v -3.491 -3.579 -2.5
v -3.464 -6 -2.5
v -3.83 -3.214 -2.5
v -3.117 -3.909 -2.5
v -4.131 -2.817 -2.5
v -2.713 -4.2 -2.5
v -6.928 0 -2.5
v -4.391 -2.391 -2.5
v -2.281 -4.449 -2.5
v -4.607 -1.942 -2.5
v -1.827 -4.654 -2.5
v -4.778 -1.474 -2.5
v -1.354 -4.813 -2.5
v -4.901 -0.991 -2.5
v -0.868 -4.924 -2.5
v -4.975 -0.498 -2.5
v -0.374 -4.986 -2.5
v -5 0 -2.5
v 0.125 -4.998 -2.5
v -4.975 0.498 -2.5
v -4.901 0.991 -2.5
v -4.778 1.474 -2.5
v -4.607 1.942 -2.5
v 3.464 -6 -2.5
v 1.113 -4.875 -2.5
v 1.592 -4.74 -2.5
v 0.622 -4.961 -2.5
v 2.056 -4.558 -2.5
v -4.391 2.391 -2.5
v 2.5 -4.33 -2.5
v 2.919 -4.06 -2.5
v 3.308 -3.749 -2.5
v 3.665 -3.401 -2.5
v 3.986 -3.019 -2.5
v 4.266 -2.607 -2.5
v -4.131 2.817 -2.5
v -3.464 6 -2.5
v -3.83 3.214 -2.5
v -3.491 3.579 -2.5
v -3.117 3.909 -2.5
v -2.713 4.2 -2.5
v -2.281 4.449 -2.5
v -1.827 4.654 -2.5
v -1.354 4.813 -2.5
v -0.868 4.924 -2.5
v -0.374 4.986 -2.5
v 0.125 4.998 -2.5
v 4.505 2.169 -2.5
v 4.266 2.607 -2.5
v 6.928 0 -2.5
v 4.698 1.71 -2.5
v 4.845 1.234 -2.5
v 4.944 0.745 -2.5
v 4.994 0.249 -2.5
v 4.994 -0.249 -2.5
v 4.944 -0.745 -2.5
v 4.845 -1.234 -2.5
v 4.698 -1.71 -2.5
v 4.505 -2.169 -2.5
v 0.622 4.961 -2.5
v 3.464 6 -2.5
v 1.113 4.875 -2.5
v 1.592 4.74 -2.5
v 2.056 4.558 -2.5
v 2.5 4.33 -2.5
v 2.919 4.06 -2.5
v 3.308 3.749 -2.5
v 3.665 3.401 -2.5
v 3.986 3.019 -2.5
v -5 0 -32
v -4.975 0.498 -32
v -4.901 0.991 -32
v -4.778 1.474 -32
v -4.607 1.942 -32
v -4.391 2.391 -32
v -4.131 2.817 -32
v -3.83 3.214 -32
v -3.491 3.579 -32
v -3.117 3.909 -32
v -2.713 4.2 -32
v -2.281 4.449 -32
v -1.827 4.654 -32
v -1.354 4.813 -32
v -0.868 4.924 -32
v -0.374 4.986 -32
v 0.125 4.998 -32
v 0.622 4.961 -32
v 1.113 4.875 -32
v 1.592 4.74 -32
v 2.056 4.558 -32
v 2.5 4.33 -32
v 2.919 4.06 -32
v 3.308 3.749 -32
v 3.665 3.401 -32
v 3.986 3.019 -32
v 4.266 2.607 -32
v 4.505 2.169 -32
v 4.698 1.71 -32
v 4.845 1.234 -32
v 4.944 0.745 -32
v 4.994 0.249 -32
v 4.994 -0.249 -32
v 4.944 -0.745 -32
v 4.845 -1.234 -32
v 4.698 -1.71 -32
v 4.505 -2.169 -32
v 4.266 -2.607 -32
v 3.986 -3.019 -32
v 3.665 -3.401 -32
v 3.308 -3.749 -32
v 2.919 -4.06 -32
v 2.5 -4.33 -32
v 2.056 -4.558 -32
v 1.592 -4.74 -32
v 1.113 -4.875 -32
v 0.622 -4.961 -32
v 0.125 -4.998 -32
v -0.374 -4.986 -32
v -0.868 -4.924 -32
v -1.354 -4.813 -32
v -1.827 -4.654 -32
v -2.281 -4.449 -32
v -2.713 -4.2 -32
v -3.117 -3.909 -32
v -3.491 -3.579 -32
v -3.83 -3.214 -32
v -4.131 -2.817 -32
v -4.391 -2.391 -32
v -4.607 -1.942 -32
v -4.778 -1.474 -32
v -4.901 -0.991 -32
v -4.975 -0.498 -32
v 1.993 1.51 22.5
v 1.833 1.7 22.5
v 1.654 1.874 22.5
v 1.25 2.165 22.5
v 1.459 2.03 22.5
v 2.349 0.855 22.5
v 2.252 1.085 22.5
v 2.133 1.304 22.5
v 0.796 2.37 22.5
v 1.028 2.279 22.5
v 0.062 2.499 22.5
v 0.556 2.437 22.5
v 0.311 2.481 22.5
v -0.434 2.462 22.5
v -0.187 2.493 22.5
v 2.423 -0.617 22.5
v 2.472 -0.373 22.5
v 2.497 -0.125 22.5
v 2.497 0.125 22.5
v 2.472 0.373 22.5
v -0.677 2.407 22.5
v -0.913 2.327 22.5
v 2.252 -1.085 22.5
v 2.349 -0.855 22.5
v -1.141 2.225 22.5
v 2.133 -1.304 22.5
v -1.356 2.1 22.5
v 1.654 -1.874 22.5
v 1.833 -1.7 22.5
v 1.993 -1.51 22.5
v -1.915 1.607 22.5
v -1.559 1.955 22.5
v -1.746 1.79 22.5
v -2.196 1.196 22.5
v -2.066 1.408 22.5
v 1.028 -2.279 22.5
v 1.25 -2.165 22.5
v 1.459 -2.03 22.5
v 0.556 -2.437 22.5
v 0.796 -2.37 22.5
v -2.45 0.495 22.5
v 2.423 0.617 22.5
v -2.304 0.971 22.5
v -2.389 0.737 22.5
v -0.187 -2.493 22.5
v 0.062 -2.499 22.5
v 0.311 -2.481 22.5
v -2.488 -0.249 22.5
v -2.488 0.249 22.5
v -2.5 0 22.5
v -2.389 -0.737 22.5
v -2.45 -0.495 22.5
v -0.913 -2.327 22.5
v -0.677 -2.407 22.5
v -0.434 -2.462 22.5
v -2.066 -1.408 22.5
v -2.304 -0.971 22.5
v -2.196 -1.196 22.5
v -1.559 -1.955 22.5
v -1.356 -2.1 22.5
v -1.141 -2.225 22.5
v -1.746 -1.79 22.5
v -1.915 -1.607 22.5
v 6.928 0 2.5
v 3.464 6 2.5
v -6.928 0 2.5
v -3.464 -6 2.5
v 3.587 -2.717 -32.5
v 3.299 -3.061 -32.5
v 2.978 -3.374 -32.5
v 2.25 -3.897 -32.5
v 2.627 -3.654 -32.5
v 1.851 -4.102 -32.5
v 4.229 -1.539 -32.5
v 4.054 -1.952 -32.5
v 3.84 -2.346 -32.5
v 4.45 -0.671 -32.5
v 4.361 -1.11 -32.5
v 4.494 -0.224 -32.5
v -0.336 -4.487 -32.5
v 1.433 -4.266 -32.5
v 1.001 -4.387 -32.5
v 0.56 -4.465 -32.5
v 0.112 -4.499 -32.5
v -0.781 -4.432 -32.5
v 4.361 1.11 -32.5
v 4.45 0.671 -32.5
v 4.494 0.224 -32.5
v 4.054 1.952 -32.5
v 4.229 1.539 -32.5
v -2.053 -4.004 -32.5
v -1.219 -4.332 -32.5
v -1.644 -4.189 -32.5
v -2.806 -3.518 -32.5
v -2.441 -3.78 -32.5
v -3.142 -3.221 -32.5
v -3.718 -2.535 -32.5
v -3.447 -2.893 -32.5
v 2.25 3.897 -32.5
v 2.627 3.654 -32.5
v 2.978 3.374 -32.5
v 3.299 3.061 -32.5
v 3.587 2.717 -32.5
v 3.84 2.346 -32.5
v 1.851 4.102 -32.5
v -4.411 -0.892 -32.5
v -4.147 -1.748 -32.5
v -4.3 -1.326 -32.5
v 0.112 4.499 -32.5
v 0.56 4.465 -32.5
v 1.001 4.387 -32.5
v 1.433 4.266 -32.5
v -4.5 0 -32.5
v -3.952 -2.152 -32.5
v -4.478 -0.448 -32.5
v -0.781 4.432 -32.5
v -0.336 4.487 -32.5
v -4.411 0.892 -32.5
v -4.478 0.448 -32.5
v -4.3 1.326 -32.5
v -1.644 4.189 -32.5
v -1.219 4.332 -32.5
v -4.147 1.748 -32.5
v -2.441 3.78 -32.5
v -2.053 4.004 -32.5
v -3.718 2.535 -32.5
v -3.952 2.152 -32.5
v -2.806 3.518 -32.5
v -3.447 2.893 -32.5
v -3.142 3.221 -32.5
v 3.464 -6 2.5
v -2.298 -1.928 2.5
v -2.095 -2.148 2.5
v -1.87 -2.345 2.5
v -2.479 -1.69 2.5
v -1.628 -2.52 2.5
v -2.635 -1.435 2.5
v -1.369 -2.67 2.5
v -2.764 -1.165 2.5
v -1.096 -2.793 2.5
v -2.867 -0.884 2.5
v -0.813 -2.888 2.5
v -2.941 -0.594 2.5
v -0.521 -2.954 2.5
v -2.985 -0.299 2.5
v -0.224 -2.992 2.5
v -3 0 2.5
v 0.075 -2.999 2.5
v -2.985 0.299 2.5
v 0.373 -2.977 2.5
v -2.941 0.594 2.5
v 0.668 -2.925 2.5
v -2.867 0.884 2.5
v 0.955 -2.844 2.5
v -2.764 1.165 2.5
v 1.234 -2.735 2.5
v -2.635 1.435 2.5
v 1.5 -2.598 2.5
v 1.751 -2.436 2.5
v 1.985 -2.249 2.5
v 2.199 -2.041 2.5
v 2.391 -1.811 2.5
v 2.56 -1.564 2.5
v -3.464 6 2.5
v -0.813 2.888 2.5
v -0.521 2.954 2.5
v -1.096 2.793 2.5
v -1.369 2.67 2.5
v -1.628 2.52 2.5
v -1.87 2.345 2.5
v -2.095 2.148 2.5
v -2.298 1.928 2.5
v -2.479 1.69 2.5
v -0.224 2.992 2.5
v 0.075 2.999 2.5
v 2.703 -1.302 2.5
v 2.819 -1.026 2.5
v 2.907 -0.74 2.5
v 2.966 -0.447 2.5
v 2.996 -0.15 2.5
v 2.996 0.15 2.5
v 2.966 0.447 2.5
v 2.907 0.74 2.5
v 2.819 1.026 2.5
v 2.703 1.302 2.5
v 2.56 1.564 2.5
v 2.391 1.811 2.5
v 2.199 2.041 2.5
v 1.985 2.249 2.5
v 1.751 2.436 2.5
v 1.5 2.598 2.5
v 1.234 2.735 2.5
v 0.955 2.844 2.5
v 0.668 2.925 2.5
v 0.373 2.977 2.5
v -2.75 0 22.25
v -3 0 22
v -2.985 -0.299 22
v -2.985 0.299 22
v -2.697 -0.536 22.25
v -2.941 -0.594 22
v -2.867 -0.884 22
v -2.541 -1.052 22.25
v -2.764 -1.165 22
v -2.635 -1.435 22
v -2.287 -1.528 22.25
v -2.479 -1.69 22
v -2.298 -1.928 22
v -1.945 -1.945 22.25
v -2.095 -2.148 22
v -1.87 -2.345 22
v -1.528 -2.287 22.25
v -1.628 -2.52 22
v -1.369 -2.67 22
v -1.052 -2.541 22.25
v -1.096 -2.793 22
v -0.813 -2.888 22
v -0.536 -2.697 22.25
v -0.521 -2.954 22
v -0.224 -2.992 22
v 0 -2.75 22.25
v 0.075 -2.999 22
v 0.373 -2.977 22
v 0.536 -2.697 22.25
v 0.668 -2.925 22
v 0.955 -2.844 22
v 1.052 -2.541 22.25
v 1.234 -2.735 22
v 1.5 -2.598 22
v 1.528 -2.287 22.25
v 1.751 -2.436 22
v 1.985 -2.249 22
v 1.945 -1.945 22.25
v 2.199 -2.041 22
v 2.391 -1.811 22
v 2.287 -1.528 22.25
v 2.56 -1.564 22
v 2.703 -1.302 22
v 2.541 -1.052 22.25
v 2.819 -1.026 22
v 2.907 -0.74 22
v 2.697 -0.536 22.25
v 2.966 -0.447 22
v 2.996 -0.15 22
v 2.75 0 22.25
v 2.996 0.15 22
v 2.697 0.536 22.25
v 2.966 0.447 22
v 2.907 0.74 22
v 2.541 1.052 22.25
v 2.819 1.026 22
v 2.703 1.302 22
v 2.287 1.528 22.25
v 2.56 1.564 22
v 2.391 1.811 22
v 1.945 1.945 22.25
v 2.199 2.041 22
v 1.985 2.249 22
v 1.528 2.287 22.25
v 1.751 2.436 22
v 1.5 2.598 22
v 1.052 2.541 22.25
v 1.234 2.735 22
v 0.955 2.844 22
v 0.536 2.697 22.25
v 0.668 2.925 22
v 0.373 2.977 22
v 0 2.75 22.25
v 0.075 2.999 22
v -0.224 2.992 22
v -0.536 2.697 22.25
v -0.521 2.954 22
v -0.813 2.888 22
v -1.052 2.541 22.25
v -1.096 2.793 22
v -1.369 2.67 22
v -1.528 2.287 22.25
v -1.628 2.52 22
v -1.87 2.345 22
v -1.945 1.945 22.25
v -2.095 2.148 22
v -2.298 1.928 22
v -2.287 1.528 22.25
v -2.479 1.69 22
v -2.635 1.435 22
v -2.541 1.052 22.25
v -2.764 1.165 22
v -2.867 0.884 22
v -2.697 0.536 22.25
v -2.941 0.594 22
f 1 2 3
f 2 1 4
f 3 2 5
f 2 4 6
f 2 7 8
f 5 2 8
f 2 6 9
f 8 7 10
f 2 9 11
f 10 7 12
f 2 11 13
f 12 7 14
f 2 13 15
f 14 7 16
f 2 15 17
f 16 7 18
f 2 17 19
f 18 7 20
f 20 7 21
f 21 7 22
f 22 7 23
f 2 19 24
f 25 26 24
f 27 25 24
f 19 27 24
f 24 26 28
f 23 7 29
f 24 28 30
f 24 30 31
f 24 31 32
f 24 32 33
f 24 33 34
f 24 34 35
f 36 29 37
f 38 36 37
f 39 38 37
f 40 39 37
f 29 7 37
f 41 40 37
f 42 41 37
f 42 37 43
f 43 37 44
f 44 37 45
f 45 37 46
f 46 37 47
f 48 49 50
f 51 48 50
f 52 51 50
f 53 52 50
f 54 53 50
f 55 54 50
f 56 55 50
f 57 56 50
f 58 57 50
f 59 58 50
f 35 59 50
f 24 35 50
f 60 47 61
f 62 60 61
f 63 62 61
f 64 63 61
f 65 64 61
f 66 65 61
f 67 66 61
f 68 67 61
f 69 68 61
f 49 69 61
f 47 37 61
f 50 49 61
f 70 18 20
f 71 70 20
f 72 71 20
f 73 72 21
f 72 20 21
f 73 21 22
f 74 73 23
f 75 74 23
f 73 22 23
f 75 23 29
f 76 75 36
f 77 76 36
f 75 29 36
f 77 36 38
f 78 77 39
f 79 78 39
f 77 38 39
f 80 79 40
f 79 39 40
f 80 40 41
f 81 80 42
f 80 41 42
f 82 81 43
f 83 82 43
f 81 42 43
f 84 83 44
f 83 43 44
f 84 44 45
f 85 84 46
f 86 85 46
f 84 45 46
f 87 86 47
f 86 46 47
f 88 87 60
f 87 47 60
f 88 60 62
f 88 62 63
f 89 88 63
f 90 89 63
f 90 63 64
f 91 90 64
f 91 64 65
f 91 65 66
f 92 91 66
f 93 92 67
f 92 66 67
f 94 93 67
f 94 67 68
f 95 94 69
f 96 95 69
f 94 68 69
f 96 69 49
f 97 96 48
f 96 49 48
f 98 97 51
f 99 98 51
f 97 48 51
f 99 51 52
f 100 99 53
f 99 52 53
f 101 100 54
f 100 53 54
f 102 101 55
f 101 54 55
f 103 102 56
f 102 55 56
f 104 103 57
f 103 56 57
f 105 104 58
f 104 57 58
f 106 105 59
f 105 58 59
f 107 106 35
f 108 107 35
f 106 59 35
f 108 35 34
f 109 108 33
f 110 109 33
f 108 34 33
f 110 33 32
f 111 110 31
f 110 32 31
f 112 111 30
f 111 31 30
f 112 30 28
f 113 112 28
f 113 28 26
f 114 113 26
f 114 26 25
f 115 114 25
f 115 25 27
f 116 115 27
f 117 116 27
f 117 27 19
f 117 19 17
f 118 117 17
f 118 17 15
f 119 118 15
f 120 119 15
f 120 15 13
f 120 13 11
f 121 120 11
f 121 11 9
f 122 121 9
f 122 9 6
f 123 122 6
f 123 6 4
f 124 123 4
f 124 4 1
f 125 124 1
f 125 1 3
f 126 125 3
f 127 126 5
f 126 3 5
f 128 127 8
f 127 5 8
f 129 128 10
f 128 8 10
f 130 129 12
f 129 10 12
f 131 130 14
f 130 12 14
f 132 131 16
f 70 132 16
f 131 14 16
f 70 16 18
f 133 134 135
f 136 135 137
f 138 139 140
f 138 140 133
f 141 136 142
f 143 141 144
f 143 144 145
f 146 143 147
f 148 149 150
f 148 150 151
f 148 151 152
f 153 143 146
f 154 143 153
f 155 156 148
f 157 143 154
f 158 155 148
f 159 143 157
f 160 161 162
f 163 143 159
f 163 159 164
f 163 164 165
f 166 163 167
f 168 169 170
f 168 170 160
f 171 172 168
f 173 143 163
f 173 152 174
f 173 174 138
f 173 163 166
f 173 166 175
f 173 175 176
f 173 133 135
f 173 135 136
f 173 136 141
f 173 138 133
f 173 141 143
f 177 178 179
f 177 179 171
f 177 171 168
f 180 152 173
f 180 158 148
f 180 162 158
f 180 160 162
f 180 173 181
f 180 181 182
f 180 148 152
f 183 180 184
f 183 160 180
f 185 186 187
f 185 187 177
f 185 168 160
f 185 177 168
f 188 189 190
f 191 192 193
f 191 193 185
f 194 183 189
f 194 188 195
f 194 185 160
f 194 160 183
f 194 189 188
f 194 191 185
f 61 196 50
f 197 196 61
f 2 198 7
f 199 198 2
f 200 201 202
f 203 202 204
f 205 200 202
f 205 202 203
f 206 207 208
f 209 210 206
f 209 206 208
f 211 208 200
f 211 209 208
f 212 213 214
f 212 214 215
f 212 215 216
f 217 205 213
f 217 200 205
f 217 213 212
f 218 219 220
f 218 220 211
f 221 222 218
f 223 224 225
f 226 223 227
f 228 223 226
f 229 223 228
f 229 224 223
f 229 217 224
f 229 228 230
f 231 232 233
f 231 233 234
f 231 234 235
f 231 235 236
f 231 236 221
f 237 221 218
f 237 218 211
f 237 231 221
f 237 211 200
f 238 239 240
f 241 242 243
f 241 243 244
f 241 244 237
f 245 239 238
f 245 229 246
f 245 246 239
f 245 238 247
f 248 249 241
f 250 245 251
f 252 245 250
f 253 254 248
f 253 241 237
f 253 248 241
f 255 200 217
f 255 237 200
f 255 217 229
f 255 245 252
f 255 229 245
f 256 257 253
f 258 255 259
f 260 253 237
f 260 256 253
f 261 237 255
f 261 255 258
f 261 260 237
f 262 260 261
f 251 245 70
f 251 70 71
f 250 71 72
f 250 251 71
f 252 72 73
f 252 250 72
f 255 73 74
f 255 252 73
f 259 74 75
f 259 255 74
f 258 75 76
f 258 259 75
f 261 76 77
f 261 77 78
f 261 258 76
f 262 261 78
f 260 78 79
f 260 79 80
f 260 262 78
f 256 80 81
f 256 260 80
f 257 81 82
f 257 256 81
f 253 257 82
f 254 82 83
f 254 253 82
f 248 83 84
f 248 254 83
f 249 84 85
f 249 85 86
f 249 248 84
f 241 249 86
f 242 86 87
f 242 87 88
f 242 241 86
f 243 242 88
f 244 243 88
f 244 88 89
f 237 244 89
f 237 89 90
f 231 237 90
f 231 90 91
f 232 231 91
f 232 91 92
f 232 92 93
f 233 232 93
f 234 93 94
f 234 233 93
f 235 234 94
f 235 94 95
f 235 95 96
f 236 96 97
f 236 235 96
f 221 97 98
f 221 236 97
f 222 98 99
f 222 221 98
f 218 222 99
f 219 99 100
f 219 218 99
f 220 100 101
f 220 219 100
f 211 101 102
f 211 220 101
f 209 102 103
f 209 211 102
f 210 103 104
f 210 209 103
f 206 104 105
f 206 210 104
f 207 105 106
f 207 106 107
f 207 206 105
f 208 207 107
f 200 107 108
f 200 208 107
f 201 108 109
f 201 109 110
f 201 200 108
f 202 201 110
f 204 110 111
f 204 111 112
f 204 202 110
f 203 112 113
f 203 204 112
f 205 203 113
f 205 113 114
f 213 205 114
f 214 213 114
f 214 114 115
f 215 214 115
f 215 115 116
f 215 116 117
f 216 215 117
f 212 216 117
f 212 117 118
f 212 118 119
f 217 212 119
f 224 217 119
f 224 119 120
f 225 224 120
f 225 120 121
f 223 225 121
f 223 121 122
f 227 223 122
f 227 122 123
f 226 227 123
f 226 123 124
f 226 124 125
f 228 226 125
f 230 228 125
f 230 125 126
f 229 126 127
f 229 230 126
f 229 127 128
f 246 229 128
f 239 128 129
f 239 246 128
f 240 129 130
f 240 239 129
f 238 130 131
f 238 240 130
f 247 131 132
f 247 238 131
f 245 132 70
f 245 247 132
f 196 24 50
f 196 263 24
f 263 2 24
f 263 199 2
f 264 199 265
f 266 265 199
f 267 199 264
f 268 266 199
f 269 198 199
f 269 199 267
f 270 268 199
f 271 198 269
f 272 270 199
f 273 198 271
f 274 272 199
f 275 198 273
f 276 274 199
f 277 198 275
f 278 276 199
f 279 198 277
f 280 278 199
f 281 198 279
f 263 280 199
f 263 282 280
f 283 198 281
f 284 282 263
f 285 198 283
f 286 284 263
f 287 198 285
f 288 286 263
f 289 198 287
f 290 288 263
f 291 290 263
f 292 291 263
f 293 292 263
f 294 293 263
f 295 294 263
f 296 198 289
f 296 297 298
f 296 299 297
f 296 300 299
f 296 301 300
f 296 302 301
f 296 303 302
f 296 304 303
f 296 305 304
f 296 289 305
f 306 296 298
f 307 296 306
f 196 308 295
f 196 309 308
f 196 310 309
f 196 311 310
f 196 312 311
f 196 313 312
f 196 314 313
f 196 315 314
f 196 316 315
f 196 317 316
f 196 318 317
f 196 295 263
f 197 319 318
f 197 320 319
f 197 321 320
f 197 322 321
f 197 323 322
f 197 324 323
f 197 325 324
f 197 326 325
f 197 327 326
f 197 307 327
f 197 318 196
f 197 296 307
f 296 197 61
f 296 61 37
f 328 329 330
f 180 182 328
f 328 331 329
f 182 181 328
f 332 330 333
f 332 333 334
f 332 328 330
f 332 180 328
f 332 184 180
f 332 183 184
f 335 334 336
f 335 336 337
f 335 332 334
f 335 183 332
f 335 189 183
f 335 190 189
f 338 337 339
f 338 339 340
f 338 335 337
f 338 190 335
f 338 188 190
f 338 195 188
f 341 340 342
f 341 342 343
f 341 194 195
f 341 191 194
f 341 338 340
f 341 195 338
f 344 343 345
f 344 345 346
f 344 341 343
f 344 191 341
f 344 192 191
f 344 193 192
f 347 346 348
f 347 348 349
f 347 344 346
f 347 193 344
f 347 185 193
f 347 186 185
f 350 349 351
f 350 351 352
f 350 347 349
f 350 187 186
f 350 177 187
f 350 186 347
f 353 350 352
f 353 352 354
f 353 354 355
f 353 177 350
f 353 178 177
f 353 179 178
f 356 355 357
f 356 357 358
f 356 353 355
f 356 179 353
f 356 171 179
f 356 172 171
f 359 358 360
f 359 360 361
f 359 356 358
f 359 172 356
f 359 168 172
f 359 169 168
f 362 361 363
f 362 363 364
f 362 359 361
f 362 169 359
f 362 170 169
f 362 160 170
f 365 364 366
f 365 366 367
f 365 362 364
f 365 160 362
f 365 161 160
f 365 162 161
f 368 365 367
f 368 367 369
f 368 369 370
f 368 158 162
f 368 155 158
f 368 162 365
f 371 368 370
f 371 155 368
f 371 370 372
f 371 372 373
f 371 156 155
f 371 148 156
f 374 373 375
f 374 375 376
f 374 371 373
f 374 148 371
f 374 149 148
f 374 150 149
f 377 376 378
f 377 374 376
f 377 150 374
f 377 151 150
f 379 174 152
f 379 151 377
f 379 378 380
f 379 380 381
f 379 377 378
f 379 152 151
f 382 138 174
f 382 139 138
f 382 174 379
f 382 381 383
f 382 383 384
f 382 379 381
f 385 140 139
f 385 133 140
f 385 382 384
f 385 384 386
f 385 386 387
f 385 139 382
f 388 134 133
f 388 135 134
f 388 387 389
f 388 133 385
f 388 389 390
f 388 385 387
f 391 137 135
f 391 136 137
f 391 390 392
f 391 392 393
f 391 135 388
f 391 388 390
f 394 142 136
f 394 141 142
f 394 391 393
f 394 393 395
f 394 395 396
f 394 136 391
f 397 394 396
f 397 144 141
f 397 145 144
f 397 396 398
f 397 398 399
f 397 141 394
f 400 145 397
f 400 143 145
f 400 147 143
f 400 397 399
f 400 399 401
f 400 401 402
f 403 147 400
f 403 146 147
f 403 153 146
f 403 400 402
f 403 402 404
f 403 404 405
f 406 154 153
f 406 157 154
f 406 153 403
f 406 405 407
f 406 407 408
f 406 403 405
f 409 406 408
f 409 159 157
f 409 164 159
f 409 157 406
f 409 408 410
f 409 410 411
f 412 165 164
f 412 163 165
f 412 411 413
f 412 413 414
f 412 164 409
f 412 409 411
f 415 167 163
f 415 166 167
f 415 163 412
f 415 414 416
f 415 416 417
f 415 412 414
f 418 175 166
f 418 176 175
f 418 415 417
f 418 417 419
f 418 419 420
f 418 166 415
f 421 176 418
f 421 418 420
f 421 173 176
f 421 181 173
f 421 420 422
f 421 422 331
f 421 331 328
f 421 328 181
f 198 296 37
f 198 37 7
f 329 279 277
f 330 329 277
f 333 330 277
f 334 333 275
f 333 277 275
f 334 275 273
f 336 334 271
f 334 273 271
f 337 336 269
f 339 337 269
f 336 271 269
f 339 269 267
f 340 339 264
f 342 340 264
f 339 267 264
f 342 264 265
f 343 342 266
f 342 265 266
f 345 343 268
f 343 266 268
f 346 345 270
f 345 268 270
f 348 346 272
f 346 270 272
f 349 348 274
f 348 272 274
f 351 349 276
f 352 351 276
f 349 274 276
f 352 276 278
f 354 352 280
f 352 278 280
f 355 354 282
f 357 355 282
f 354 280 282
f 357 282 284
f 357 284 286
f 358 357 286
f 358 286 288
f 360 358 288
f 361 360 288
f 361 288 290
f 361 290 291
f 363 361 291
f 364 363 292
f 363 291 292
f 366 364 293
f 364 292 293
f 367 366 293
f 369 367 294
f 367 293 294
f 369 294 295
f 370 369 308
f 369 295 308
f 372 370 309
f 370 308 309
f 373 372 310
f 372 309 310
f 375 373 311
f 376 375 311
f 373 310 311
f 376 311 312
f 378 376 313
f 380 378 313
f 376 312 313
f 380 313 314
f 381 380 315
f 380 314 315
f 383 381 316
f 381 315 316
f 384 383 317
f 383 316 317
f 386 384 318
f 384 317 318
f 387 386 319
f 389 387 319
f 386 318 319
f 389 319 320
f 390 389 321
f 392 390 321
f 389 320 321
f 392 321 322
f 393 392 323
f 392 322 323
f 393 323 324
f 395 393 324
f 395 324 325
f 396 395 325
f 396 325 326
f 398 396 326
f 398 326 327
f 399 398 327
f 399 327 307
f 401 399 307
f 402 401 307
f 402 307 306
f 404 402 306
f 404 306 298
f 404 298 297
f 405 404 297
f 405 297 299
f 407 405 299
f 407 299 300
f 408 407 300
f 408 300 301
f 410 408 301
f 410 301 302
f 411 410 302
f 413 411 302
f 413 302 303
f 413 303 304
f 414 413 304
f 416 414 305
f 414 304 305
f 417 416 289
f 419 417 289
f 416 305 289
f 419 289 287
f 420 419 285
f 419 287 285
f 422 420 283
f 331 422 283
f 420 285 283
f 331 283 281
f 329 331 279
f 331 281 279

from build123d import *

# Parameters (mm, degrees)
EXTRUS_O1_DEPTH = 2.5
ESBO_O2_R       = 3
EXTRUS_O2_DEPTH = 20
ESBO_O3_R       = 5
EXTRUS_O3_DEPTH = 30
CHANFRO1_SIZE   = 0.5


with BuildPart() as part:
    # Esboço1 → Extrusão1 (new, symmetric)
    with BuildSketch(Plane.XY):
        Polygon((6.92820323, 0), (3.464101615, 6), (-3.464101615, 6), (-6.92820323, 0), (-3.464101615, -6), (3.464101615, -6), align=None)
    extrude(amount=EXTRUS_O1_DEPTH, both=True)

    # Esboço2 → Extrusão2 (add)
    with BuildSketch(Plane.XY.offset(2.5)):
        with Locations(Location((0, 0, 0), (0, 0, 180))):
            Circle(ESBO_O2_R)
    extrude(amount=EXTRUS_O2_DEPTH)

    # Esboço3 → Extrusão3 (add)
    with BuildSketch(Plane(origin=(0, 0, -2.5), x_dir=(-1, 0, 0), z_dir=(0, 0, -1))):
        Circle(ESBO_O3_R)
    extrude(amount=EXTRUS_O3_DEPTH)

    # Chanfro1
    chanfro1_edges = [part.edges().sort_by_distance(p)[0] for p in [
        (3, 0, 22.5),
        (5, 0, -32.5),
    ]]
    chamfer(chanfro1_edges, length=CHANFRO1_SIZE)


solid = part.part
